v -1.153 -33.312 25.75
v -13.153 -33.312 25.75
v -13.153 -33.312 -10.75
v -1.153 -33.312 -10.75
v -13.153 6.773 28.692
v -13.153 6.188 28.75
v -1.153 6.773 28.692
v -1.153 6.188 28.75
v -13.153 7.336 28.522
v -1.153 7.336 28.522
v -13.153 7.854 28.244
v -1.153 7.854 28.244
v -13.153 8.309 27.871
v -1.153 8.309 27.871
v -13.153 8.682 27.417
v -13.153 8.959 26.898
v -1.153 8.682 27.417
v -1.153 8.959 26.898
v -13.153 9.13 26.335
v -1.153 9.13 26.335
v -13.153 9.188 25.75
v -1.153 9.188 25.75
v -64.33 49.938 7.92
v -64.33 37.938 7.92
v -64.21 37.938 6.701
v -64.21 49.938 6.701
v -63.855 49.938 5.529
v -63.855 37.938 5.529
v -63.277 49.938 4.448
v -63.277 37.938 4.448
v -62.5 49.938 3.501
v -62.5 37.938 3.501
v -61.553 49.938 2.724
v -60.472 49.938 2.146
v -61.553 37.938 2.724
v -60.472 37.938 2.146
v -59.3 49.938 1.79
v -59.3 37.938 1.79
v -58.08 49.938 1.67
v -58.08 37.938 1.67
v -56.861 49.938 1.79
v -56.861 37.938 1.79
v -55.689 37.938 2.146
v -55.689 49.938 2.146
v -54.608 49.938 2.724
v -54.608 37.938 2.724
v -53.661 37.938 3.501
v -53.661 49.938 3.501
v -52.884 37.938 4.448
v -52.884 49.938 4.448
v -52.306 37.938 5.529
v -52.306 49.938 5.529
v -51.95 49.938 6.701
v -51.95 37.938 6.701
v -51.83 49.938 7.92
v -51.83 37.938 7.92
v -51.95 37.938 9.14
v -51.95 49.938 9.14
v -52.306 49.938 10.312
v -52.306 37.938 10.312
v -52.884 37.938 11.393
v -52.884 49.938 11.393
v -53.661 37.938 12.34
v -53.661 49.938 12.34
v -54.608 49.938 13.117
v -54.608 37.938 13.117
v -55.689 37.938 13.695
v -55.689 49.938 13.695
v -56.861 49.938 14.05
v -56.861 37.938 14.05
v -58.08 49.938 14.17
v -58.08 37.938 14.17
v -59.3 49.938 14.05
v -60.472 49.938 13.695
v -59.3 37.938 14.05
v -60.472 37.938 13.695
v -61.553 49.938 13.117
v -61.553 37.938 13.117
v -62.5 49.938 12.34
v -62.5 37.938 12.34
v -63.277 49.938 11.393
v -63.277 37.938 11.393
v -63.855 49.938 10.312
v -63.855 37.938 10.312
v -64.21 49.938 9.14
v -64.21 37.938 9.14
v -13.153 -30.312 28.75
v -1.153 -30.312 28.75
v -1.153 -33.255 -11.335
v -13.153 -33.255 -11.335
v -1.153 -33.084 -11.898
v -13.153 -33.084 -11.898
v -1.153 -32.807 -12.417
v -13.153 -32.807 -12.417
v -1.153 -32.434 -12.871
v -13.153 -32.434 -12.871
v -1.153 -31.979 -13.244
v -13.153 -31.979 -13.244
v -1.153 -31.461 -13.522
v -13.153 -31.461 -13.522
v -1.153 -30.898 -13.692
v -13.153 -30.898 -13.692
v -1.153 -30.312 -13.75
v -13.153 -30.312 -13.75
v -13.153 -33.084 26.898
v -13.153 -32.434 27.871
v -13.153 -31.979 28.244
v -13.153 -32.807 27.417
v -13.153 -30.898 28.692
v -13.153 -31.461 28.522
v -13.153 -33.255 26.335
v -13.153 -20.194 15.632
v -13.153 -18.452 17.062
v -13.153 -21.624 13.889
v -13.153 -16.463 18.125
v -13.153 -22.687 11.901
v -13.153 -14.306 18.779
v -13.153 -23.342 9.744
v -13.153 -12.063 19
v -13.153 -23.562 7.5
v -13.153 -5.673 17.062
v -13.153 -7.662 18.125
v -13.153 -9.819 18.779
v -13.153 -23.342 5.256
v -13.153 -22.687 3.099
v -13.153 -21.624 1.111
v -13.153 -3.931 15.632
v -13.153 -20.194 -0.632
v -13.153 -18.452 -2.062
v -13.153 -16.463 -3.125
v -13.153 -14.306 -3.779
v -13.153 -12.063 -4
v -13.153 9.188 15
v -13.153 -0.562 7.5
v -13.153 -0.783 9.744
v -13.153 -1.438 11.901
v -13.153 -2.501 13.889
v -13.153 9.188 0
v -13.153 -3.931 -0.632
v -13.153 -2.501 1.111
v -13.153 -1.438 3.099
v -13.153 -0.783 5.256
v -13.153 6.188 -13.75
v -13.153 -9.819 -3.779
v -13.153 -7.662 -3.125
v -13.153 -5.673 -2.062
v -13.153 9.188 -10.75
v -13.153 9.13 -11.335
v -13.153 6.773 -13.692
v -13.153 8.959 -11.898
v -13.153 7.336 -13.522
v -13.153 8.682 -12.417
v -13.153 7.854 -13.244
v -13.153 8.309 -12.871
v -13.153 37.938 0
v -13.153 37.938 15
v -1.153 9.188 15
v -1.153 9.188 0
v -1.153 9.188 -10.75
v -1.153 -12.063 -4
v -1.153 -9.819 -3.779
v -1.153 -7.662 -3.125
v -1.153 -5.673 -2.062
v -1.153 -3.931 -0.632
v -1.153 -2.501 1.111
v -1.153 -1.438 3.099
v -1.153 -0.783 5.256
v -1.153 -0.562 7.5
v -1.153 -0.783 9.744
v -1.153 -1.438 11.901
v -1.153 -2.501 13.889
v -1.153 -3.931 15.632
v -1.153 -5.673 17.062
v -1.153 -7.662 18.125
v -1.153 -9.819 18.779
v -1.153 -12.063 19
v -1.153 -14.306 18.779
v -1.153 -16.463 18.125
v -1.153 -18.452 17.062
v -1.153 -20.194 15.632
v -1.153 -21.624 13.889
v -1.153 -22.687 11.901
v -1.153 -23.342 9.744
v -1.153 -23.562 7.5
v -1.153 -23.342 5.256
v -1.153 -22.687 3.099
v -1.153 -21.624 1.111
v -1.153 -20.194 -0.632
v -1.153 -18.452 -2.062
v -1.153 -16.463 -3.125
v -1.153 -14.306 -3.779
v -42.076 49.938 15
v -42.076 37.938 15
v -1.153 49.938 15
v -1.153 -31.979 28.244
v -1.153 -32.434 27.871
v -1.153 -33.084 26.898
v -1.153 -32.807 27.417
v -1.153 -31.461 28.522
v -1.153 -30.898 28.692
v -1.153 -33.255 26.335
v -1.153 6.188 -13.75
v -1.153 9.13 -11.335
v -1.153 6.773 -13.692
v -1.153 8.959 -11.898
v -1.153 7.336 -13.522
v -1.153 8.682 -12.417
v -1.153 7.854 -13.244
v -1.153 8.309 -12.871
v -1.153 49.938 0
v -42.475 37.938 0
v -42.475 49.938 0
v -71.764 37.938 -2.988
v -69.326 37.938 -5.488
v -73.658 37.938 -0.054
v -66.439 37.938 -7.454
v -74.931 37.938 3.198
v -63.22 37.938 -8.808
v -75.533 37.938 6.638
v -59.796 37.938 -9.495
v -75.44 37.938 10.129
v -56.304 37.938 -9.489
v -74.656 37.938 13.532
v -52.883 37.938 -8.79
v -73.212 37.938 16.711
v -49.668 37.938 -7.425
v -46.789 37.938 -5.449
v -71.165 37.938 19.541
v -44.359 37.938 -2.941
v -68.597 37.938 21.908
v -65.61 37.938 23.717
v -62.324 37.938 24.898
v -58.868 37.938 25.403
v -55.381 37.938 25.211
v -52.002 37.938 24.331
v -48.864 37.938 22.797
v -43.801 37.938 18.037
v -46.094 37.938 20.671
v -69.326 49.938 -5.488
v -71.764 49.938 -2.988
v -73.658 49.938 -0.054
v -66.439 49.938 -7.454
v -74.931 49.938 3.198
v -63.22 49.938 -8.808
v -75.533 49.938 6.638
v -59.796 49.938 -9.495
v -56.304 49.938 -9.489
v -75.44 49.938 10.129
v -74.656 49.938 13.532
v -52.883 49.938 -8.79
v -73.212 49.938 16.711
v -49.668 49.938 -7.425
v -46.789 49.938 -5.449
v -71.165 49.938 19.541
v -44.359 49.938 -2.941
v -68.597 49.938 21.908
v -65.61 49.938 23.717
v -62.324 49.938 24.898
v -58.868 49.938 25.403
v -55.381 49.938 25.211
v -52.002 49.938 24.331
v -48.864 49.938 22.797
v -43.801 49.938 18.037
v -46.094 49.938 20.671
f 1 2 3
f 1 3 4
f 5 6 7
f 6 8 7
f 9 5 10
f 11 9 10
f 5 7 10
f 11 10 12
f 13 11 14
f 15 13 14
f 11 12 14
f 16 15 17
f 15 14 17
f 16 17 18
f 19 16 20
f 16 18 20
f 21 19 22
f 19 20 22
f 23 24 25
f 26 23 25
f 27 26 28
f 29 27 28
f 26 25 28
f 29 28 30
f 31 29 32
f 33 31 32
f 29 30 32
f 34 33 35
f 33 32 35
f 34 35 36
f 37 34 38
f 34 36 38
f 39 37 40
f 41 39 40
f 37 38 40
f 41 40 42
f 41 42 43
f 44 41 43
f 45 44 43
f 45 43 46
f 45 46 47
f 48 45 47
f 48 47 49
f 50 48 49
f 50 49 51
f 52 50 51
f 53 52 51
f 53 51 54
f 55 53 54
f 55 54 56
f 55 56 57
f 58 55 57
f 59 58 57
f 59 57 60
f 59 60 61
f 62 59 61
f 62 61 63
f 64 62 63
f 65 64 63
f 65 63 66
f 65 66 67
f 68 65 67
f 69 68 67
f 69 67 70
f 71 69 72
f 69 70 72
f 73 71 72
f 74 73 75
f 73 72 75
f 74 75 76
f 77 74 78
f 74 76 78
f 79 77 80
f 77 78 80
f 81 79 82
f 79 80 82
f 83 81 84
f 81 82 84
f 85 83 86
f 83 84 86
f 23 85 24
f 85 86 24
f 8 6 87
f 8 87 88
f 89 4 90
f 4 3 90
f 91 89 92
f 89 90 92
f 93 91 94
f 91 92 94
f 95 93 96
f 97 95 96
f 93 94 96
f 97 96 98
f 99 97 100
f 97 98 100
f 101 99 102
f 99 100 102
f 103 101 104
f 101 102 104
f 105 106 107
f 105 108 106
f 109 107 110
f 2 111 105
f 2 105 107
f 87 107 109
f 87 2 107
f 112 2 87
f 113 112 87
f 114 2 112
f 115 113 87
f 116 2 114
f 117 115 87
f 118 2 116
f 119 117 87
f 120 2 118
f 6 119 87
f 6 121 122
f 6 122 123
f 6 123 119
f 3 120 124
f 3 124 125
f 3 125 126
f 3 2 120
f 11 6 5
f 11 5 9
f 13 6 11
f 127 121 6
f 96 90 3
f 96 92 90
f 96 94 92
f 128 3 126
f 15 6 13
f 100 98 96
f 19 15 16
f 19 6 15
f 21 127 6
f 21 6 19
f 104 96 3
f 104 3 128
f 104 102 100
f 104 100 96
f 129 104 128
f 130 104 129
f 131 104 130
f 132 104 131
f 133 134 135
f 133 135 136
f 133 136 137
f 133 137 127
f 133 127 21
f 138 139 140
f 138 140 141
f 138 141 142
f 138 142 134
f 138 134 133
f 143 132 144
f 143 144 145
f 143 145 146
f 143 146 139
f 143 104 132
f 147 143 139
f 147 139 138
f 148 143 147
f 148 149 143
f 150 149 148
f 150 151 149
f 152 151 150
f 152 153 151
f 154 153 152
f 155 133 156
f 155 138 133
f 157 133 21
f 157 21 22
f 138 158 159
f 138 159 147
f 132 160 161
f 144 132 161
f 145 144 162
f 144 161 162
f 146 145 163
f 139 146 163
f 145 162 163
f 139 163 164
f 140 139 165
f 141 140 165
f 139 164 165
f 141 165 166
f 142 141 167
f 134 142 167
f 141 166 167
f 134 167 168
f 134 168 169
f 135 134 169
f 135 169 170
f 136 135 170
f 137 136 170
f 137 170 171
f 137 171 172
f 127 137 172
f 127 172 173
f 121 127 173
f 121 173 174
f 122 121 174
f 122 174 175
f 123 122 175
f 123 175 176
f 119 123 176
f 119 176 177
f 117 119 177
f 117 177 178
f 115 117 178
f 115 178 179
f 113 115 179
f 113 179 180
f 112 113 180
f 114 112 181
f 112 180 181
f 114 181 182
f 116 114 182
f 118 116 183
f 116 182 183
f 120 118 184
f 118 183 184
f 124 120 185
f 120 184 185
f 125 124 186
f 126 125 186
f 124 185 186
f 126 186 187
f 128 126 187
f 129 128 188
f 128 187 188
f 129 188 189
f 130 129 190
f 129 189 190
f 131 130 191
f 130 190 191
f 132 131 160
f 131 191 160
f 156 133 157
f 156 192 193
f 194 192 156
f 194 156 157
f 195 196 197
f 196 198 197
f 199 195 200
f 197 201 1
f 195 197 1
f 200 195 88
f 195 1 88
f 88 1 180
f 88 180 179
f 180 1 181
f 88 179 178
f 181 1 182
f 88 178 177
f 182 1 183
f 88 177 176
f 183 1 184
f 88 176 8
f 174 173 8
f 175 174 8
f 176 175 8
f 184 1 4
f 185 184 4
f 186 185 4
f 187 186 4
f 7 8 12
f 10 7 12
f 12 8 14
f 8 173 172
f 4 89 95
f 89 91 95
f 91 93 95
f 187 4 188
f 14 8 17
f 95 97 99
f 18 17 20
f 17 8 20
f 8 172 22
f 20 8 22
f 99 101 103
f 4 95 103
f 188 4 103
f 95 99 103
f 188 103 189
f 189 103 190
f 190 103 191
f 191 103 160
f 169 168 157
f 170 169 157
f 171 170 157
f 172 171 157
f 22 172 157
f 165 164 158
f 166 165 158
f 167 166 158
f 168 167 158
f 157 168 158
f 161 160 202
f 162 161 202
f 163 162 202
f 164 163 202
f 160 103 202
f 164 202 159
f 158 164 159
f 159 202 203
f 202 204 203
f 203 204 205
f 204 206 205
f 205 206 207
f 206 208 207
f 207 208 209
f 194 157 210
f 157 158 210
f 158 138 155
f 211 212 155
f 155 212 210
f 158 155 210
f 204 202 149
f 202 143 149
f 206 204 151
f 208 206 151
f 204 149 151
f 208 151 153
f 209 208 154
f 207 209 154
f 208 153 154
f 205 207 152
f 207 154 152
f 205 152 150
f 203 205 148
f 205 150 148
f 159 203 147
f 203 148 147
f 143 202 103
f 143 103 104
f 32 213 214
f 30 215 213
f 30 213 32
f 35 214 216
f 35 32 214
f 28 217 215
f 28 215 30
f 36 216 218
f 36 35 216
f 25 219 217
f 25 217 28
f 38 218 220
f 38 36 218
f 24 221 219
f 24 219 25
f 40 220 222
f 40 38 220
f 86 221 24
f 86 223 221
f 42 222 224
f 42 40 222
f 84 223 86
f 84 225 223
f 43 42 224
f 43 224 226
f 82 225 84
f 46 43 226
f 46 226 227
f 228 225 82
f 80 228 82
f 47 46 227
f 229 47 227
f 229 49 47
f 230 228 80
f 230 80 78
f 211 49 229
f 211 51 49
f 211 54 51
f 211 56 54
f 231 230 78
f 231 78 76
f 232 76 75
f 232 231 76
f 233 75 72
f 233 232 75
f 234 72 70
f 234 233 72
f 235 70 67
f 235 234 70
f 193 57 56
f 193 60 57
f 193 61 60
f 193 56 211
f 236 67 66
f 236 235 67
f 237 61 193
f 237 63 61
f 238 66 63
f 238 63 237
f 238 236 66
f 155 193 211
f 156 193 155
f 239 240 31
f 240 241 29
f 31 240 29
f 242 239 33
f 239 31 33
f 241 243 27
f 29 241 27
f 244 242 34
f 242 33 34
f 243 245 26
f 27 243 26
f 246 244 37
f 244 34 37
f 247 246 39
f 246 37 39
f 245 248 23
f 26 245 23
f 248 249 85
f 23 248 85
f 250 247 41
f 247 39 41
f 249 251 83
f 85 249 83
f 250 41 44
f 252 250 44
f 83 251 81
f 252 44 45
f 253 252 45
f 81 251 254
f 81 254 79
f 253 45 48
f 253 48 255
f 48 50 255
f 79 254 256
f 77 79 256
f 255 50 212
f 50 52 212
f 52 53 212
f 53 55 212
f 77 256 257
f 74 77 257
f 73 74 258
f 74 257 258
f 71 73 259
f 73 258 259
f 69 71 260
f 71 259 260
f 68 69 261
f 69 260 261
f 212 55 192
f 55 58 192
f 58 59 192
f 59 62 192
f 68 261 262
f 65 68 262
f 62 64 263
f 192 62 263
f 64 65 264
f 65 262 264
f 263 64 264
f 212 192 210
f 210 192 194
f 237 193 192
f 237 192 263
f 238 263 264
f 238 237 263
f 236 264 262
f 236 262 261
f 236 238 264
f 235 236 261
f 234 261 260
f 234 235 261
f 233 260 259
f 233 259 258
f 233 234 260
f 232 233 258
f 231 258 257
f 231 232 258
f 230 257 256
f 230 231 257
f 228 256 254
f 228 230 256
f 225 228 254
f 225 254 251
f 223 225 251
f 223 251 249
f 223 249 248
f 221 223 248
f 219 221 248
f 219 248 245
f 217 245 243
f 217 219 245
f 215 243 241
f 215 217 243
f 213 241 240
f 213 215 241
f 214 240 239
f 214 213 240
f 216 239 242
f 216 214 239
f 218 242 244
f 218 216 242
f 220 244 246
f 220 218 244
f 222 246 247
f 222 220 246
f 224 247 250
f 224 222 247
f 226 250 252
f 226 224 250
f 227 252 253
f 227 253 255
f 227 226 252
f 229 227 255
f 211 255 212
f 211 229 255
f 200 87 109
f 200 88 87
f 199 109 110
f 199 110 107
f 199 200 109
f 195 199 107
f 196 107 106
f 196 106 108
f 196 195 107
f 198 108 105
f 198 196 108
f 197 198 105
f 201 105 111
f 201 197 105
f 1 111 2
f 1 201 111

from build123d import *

# Parameters (mm, degrees)
Y_KSEKLIK_EKSTR_ZYON1_DEPTH = 12
IZIM2_W                     = 12
IZIM2_H                     = 15
Y_KSEKLIK_EKSTR_ZYON2_DEPTH = 71.25
IZIM3_W                     = 12
IZIM3_H                     = 42.5
Y_KSEKLIK_EKSTR_ZYON3_DEPTH = 13.75
IZIM4_W                     = 12
IZIM4_H                     = 42.5
Y_KSEKLIK_EKSTR_ZYON4_DEPTH = 13.75
F_23_0_23_AP_DELIK1_D       = 23
F_12_5_12_5_AP_DELIK1_D     = 12.5
F_12_5_12_5_AP_DELIK1_DEPTH = 83.25
RADYUS1_R                   = 3


with BuildPart() as part:
    # Çizim1 → Yükseklik-Ekstrüzyon1 (new body)
    with BuildSketch(Plane.XZ.offset(-37.9375)):
        with BuildLine():
            Line((-1.153440428, 15), (-42.076338309, 15))
            ThreePointArc((-42.076338309, 15), (-75.574161168, 8.385590262), (-42.47527254, 0))
            Line((-42.47527254, 0), (-1.153440428, 0))
            Line((-1.153440428, 0), (-1.153440428, 15))
        make_face()
    extrude(amount=-Y_KSEKLIK_EKSTR_ZYON1_DEPTH)

    # Çizim2 → Yükseklik-Ekstrüzyon2 (add)
    with BuildSketch(Plane.XZ.offset(-37.9375)):
        with Locations((-7.153440428, 7.5)):
            Rectangle(IZIM2_W, IZIM2_H)
    extrude(amount=Y_KSEKLIK_EKSTR_ZYON2_DEPTH)

    # Çizim3 → Yükseklik-Ekstrüzyon3 (add)
    with BuildSketch(Plane(origin=(0, 0, 0), x_dir=(-1, 0, 0), z_dir=(0, 0, -1))):
        with Locations((7.153440428, -12.0625)):
            Rectangle(IZIM3_W, IZIM3_H)
    extrude(amount=Y_KSEKLIK_EKSTR_ZYON3_DEPTH)

    # Çizim4 → Yükseklik-Ekstrüzyon4 (add)
    with BuildSketch(Plane.XY.offset(15)):
        with Locations((-7.153440428, -12.0625)):
            Rectangle(IZIM4_W, IZIM4_H)
    extrude(amount=Y_KSEKLIK_EKSTR_ZYON4_DEPTH)

    # Ø23.0 (23) Çap Delik1 (through all)
    with Locations(Plane.ZY.offset(13.153440428)):
        with Locations((7.5, -12.0625)):
            Hole(F_23_0_23_AP_DELIK1_D / 2)

    # Ø12.5 (12.5) Çap Delik1
    with Locations(Plane(origin=(0, 49.9375, 0), x_dir=(1, 0, 0), z_dir=(0, 1, 0))):
        with Locations((-58.080346996, -7.920331509)):
            Hole(F_12_5_12_5_AP_DELIK1_D / 2, depth=F_12_5_12_5_AP_DELIK1_DEPTH)

    # Radyus1
    radyus1_edges = [part.edges().sort_by_distance(p)[0] for p in [
        (-7.153440428, -33.3125, -13.75),
        (-7.153440428, 9.1875, -13.75),
        (-7.153440428, -33.3125, 28.75),
        (-7.153440428, 9.1875, 28.75),
    ]]
    fillet(radyus1_edges, radius=RADYUS1_R)


solid = part.part
